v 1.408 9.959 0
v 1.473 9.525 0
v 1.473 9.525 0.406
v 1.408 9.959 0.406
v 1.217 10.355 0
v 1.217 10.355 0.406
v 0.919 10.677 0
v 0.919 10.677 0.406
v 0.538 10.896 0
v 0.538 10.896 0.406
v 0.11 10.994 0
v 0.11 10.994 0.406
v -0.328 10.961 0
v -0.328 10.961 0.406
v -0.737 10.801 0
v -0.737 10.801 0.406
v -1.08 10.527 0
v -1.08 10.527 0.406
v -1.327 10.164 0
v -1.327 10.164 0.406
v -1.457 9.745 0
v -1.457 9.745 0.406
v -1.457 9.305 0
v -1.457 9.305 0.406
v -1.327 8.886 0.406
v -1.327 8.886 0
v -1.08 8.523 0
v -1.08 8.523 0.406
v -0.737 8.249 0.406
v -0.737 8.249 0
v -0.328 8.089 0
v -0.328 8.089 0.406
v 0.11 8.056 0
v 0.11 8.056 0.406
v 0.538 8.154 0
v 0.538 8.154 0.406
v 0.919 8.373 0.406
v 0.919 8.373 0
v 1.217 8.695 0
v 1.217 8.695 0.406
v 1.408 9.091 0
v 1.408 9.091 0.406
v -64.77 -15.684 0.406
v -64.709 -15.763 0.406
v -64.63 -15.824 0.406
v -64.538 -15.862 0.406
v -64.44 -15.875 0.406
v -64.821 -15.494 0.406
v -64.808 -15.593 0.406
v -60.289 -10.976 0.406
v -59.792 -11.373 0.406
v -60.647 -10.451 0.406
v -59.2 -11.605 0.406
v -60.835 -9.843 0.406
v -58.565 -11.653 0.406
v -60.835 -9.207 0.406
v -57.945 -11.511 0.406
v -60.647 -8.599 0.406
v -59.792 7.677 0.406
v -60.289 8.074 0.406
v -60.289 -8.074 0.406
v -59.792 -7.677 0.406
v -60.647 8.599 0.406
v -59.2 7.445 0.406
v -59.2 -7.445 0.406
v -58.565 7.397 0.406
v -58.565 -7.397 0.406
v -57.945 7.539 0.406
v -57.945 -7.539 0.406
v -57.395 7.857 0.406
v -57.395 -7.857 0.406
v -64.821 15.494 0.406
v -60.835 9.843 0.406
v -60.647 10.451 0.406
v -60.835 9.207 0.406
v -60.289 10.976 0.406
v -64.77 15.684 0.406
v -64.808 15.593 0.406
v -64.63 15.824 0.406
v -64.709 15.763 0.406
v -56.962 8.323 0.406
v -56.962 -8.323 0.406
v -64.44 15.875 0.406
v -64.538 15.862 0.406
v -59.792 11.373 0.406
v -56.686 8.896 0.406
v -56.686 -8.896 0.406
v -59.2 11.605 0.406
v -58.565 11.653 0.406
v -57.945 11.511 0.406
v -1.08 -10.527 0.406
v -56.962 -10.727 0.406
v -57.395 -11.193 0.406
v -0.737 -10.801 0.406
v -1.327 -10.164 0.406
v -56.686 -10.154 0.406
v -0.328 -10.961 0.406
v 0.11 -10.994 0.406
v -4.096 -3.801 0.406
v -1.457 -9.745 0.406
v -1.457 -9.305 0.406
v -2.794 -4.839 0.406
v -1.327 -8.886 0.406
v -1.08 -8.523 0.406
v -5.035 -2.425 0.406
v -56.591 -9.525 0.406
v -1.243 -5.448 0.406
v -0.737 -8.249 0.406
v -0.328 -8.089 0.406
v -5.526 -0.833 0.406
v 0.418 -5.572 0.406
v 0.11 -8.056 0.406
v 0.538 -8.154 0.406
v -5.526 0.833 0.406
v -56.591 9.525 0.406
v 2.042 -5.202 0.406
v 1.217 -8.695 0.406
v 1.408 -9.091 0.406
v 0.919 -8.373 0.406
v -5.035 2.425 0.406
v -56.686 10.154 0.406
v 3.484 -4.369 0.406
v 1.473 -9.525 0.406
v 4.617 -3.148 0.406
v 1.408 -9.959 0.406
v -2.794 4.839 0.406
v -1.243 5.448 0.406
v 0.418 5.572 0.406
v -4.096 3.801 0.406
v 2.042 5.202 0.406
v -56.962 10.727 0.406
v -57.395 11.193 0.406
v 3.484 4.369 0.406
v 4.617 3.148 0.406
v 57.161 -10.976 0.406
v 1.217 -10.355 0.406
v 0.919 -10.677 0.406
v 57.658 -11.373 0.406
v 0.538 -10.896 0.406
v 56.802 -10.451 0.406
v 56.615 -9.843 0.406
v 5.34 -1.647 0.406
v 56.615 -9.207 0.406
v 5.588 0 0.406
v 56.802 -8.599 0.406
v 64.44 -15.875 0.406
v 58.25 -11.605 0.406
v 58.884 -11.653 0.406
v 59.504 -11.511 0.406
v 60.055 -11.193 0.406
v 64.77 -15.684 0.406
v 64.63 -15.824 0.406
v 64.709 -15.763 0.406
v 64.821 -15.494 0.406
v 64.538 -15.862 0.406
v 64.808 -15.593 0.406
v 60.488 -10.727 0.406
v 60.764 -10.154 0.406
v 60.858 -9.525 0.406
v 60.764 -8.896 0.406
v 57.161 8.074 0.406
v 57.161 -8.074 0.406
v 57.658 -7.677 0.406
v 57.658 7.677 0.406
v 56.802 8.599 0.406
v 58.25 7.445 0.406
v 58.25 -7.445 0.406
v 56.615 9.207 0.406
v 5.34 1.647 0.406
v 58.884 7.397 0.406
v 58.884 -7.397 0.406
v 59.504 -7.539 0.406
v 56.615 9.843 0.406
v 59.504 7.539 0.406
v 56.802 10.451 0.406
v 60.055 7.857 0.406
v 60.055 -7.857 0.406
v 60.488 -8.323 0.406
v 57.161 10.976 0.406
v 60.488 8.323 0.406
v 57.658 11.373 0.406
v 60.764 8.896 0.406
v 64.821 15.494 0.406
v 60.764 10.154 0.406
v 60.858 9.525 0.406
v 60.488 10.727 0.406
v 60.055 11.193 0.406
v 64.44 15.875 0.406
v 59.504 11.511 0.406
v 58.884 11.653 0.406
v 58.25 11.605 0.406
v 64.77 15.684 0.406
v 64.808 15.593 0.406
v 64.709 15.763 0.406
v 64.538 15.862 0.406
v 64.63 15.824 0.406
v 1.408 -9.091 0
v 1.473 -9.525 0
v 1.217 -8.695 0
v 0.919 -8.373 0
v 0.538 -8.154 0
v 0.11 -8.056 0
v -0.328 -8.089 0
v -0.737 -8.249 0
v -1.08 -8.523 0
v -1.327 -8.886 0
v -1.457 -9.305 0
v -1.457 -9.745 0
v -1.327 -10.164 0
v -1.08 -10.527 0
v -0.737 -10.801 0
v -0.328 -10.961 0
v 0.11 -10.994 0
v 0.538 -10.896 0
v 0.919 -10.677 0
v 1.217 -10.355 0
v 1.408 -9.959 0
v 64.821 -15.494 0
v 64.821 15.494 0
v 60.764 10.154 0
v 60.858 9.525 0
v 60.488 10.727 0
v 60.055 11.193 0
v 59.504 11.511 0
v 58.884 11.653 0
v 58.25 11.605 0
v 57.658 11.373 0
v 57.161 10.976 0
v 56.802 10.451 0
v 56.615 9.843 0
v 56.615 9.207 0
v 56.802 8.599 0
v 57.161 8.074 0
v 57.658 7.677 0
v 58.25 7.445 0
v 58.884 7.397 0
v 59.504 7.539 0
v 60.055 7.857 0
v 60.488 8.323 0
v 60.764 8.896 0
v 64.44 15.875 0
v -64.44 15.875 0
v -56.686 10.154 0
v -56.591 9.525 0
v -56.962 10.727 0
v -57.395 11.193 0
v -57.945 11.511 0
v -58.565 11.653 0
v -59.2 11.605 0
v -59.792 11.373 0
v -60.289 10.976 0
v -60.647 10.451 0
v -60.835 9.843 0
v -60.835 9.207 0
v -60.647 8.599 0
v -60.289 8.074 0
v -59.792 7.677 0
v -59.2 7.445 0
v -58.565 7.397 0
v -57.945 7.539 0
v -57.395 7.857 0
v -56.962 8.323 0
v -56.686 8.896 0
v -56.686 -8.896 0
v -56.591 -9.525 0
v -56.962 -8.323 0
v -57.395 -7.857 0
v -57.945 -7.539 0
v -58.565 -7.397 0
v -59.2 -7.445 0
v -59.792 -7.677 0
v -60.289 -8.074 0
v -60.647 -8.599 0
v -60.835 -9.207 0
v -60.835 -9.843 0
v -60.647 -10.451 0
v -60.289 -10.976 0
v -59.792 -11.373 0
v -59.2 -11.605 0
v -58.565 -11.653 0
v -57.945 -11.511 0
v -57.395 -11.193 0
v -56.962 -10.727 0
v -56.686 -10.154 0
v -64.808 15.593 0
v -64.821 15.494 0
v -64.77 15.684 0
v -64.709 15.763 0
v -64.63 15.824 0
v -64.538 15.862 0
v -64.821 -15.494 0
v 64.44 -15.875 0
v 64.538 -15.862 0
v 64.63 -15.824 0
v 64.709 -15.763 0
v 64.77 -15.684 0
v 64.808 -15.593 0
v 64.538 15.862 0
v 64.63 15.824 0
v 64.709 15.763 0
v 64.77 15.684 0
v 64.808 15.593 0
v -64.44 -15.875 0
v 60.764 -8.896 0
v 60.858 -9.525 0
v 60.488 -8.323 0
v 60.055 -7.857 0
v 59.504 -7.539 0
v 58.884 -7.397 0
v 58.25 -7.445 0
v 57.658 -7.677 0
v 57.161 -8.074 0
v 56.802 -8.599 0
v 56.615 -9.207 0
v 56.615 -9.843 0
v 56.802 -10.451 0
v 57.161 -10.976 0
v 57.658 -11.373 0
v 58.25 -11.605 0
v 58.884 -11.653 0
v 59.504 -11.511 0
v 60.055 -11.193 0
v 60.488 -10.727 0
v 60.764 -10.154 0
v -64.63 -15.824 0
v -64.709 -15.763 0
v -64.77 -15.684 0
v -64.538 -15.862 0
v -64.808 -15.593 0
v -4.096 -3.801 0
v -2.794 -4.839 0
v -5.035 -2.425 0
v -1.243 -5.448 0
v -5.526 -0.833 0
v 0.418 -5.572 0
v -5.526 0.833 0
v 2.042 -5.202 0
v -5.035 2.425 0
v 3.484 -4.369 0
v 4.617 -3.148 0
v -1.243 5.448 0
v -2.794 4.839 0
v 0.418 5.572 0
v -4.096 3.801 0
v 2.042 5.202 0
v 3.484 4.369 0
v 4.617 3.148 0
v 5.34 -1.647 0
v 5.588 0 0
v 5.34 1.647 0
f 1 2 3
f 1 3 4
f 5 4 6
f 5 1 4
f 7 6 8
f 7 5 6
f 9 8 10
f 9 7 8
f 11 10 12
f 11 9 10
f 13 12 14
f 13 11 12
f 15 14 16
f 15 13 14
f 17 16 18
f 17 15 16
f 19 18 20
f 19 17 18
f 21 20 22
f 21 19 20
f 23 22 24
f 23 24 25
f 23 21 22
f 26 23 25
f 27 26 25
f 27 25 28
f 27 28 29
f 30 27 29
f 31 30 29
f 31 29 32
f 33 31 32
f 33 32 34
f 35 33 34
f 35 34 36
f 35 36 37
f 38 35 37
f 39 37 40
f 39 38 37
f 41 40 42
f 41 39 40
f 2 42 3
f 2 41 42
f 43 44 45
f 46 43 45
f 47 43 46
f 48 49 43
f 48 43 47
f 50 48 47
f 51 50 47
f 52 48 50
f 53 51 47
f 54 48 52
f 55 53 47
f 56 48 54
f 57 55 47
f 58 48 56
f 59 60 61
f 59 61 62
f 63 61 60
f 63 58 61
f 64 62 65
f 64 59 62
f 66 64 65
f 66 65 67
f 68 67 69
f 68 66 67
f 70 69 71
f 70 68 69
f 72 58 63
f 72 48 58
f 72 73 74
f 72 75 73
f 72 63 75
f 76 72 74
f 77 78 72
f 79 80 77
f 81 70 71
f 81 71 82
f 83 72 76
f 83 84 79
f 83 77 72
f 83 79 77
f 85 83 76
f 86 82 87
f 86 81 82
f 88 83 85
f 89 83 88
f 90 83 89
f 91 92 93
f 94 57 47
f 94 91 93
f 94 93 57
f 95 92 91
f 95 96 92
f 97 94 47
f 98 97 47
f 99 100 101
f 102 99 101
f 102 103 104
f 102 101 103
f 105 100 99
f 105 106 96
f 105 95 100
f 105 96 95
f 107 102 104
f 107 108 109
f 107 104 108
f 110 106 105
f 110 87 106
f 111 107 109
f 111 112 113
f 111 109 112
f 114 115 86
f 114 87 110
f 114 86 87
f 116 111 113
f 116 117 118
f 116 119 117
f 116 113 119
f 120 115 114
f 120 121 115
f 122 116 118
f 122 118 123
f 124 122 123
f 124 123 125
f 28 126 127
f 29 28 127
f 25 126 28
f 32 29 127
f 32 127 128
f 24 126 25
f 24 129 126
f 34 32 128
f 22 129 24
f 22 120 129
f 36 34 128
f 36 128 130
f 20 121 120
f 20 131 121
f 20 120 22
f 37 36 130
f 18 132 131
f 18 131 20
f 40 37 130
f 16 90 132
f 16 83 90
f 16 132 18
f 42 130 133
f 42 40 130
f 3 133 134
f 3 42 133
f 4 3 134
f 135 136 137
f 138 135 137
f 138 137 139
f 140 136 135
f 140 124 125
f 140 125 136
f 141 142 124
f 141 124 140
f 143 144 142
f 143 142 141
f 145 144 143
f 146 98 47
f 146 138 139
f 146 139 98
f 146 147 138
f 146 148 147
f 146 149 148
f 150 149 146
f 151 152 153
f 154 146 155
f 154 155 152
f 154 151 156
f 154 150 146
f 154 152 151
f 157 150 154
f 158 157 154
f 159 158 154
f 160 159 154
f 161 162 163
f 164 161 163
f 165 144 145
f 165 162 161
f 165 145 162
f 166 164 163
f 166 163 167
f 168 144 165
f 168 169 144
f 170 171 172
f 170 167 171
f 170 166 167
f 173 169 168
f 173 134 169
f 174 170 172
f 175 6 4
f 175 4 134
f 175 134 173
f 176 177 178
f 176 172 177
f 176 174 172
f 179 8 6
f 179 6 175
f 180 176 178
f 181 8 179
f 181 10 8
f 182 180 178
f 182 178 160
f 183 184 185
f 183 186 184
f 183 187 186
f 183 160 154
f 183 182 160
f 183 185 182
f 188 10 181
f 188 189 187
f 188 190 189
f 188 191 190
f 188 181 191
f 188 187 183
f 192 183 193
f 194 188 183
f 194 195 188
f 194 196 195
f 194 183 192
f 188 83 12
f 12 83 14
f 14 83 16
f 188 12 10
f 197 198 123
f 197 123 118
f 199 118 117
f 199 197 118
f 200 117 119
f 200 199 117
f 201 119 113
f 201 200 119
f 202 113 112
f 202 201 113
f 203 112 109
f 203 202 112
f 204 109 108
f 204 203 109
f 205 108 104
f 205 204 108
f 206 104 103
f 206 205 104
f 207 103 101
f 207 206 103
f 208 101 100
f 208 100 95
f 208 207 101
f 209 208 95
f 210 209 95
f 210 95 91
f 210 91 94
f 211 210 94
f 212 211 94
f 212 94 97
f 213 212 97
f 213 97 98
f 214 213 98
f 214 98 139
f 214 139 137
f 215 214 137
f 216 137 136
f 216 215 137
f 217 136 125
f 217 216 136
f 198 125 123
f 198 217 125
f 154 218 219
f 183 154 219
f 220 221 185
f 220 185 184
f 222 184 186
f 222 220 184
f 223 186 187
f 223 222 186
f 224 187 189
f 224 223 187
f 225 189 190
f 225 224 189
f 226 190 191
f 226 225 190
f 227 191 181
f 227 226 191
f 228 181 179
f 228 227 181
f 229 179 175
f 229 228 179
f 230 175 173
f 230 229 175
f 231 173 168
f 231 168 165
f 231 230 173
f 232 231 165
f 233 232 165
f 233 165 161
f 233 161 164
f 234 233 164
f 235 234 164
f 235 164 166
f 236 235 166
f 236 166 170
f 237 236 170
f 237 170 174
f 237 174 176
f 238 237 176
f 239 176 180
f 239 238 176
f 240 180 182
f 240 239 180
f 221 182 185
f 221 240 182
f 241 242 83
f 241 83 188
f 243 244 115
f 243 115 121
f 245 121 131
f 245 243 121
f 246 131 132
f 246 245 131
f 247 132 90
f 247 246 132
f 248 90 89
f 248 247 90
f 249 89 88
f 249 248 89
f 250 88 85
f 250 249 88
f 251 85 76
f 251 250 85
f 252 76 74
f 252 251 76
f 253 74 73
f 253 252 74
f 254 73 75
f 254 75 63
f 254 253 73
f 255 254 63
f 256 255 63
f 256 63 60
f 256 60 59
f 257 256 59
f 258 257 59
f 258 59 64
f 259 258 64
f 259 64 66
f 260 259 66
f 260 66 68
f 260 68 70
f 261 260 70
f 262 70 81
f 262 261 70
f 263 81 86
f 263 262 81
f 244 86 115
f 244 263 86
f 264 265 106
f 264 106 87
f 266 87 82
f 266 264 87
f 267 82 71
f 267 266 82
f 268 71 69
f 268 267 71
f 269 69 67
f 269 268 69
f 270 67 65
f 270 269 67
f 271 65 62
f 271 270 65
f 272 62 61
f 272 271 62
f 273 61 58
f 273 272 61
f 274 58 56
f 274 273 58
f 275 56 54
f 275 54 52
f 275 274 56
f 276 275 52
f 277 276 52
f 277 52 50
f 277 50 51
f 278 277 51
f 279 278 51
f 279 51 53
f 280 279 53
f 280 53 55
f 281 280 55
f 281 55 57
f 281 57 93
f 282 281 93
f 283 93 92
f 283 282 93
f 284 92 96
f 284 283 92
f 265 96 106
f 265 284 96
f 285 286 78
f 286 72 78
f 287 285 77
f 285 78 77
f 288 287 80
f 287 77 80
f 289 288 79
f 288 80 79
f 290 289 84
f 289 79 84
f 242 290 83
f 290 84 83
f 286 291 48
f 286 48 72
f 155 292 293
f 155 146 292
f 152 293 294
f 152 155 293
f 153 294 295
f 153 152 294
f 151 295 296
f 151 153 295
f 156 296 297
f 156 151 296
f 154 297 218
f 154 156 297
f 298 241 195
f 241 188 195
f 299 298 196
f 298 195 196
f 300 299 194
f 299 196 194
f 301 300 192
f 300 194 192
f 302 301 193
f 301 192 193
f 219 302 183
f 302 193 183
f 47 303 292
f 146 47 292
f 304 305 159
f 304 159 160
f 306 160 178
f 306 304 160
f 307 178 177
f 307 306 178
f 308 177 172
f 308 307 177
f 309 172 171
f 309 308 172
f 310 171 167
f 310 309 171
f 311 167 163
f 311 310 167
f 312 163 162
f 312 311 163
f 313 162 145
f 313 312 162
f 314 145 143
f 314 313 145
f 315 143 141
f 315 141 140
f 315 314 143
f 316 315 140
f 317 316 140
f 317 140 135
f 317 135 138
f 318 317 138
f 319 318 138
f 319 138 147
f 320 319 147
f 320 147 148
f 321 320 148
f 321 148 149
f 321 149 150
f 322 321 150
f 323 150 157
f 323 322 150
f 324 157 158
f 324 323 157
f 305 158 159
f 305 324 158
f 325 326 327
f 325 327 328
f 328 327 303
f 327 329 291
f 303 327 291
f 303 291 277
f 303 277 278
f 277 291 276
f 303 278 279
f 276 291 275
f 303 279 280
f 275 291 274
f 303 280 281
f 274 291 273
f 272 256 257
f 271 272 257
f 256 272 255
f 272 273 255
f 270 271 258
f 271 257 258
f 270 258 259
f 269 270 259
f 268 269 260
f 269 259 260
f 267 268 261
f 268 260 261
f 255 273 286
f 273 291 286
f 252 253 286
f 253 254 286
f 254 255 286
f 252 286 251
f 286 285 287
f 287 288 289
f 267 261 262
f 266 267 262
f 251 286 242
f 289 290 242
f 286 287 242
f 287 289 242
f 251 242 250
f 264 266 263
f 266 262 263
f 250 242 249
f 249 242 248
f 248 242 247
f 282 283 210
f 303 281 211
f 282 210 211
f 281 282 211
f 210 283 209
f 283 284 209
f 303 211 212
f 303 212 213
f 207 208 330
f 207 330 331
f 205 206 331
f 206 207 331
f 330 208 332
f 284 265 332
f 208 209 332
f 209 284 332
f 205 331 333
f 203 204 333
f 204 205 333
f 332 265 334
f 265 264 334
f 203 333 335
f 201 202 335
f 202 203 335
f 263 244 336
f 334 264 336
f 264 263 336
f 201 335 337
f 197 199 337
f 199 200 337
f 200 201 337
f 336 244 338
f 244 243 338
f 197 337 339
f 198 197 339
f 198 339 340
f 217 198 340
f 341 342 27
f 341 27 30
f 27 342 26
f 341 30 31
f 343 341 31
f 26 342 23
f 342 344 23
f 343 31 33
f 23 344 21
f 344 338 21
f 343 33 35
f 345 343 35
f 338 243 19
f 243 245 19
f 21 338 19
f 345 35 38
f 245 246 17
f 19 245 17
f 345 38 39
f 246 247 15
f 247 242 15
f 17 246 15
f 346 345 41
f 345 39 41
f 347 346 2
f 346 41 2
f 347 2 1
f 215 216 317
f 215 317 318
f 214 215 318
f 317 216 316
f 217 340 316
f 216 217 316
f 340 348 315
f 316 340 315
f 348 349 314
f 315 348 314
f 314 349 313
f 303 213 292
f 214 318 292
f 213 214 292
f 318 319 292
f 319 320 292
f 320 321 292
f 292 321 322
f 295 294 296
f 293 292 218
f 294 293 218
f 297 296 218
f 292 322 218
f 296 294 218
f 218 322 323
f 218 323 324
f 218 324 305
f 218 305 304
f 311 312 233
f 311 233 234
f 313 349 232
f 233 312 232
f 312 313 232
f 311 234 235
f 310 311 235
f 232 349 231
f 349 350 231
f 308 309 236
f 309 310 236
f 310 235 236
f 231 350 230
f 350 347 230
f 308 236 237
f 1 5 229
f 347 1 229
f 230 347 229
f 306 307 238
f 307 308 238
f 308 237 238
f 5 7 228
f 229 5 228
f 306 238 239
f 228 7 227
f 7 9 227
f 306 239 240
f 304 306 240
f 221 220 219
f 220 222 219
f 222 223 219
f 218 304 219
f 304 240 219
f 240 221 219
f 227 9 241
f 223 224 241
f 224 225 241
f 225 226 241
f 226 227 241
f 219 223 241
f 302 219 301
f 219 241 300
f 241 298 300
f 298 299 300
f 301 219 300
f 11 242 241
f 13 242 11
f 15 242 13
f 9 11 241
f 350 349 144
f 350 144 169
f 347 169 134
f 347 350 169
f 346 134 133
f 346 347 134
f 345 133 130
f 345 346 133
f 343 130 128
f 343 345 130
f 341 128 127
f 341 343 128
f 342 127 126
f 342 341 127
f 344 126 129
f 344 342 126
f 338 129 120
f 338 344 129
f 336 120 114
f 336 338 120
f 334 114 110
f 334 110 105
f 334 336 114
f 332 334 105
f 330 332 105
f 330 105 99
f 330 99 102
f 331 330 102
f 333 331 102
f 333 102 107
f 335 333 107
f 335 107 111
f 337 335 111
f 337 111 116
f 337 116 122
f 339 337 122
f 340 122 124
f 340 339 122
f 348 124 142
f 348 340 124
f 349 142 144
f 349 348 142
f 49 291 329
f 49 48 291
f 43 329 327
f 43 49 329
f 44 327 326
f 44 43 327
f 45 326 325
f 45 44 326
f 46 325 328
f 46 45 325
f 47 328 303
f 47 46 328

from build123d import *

# Parameters (mm, degrees)
SKETCH1_W           = 129.6416
SKETCH1_H           = 31.75
SKETCH1_R           = 2.1336
SKETCH1_R_2         = 5.588
SKETCH1_R_3         = 1.4732
BOSS_EXTRUDE1_DEPTH = 0.4064
FILLET1_R           = 0.381


with BuildPart() as part:
    # Sketch1 → Boss-Extrude1 (new body)
    with BuildSketch(Plane.XY):
        Rectangle(SKETCH1_W, SKETCH1_H)
        with Locations((58.7248, 9.525)):
            Circle(SKETCH1_R, mode=Mode.SUBTRACT)
        with Locations((58.7248, -9.525)):
            Circle(SKETCH1_R, mode=Mode.SUBTRACT)
        Circle(SKETCH1_R_2, mode=Mode.SUBTRACT)
        with Locations((0, 9.525)):
            Circle(SKETCH1_R_3, mode=Mode.SUBTRACT)
        with Locations((0, -9.525)):
            Circle(SKETCH1_R_3, mode=Mode.SUBTRACT)
        with Locations((-58.7248, 9.525)):
            Circle(SKETCH1_R, mode=Mode.SUBTRACT)
        with Locations((-58.7248, -9.525)):
            Circle(SKETCH1_R, mode=Mode.SUBTRACT)
    extrude(amount=BOSS_EXTRUDE1_DEPTH)

    # Fillet1
    fillet1_edges = [part.edges().sort_by_distance(p)[0] for p in [
        (-64.8208, 15.875, 0.2032),
        (64.8208, 15.875, 0.2032),
        (64.8208, -15.875, 0.2032),
        (-64.8208, -15.875, 0.2032),
    ]]
    fillet(fillet1_edges, radius=FILLET1_R)


solid = part.part
